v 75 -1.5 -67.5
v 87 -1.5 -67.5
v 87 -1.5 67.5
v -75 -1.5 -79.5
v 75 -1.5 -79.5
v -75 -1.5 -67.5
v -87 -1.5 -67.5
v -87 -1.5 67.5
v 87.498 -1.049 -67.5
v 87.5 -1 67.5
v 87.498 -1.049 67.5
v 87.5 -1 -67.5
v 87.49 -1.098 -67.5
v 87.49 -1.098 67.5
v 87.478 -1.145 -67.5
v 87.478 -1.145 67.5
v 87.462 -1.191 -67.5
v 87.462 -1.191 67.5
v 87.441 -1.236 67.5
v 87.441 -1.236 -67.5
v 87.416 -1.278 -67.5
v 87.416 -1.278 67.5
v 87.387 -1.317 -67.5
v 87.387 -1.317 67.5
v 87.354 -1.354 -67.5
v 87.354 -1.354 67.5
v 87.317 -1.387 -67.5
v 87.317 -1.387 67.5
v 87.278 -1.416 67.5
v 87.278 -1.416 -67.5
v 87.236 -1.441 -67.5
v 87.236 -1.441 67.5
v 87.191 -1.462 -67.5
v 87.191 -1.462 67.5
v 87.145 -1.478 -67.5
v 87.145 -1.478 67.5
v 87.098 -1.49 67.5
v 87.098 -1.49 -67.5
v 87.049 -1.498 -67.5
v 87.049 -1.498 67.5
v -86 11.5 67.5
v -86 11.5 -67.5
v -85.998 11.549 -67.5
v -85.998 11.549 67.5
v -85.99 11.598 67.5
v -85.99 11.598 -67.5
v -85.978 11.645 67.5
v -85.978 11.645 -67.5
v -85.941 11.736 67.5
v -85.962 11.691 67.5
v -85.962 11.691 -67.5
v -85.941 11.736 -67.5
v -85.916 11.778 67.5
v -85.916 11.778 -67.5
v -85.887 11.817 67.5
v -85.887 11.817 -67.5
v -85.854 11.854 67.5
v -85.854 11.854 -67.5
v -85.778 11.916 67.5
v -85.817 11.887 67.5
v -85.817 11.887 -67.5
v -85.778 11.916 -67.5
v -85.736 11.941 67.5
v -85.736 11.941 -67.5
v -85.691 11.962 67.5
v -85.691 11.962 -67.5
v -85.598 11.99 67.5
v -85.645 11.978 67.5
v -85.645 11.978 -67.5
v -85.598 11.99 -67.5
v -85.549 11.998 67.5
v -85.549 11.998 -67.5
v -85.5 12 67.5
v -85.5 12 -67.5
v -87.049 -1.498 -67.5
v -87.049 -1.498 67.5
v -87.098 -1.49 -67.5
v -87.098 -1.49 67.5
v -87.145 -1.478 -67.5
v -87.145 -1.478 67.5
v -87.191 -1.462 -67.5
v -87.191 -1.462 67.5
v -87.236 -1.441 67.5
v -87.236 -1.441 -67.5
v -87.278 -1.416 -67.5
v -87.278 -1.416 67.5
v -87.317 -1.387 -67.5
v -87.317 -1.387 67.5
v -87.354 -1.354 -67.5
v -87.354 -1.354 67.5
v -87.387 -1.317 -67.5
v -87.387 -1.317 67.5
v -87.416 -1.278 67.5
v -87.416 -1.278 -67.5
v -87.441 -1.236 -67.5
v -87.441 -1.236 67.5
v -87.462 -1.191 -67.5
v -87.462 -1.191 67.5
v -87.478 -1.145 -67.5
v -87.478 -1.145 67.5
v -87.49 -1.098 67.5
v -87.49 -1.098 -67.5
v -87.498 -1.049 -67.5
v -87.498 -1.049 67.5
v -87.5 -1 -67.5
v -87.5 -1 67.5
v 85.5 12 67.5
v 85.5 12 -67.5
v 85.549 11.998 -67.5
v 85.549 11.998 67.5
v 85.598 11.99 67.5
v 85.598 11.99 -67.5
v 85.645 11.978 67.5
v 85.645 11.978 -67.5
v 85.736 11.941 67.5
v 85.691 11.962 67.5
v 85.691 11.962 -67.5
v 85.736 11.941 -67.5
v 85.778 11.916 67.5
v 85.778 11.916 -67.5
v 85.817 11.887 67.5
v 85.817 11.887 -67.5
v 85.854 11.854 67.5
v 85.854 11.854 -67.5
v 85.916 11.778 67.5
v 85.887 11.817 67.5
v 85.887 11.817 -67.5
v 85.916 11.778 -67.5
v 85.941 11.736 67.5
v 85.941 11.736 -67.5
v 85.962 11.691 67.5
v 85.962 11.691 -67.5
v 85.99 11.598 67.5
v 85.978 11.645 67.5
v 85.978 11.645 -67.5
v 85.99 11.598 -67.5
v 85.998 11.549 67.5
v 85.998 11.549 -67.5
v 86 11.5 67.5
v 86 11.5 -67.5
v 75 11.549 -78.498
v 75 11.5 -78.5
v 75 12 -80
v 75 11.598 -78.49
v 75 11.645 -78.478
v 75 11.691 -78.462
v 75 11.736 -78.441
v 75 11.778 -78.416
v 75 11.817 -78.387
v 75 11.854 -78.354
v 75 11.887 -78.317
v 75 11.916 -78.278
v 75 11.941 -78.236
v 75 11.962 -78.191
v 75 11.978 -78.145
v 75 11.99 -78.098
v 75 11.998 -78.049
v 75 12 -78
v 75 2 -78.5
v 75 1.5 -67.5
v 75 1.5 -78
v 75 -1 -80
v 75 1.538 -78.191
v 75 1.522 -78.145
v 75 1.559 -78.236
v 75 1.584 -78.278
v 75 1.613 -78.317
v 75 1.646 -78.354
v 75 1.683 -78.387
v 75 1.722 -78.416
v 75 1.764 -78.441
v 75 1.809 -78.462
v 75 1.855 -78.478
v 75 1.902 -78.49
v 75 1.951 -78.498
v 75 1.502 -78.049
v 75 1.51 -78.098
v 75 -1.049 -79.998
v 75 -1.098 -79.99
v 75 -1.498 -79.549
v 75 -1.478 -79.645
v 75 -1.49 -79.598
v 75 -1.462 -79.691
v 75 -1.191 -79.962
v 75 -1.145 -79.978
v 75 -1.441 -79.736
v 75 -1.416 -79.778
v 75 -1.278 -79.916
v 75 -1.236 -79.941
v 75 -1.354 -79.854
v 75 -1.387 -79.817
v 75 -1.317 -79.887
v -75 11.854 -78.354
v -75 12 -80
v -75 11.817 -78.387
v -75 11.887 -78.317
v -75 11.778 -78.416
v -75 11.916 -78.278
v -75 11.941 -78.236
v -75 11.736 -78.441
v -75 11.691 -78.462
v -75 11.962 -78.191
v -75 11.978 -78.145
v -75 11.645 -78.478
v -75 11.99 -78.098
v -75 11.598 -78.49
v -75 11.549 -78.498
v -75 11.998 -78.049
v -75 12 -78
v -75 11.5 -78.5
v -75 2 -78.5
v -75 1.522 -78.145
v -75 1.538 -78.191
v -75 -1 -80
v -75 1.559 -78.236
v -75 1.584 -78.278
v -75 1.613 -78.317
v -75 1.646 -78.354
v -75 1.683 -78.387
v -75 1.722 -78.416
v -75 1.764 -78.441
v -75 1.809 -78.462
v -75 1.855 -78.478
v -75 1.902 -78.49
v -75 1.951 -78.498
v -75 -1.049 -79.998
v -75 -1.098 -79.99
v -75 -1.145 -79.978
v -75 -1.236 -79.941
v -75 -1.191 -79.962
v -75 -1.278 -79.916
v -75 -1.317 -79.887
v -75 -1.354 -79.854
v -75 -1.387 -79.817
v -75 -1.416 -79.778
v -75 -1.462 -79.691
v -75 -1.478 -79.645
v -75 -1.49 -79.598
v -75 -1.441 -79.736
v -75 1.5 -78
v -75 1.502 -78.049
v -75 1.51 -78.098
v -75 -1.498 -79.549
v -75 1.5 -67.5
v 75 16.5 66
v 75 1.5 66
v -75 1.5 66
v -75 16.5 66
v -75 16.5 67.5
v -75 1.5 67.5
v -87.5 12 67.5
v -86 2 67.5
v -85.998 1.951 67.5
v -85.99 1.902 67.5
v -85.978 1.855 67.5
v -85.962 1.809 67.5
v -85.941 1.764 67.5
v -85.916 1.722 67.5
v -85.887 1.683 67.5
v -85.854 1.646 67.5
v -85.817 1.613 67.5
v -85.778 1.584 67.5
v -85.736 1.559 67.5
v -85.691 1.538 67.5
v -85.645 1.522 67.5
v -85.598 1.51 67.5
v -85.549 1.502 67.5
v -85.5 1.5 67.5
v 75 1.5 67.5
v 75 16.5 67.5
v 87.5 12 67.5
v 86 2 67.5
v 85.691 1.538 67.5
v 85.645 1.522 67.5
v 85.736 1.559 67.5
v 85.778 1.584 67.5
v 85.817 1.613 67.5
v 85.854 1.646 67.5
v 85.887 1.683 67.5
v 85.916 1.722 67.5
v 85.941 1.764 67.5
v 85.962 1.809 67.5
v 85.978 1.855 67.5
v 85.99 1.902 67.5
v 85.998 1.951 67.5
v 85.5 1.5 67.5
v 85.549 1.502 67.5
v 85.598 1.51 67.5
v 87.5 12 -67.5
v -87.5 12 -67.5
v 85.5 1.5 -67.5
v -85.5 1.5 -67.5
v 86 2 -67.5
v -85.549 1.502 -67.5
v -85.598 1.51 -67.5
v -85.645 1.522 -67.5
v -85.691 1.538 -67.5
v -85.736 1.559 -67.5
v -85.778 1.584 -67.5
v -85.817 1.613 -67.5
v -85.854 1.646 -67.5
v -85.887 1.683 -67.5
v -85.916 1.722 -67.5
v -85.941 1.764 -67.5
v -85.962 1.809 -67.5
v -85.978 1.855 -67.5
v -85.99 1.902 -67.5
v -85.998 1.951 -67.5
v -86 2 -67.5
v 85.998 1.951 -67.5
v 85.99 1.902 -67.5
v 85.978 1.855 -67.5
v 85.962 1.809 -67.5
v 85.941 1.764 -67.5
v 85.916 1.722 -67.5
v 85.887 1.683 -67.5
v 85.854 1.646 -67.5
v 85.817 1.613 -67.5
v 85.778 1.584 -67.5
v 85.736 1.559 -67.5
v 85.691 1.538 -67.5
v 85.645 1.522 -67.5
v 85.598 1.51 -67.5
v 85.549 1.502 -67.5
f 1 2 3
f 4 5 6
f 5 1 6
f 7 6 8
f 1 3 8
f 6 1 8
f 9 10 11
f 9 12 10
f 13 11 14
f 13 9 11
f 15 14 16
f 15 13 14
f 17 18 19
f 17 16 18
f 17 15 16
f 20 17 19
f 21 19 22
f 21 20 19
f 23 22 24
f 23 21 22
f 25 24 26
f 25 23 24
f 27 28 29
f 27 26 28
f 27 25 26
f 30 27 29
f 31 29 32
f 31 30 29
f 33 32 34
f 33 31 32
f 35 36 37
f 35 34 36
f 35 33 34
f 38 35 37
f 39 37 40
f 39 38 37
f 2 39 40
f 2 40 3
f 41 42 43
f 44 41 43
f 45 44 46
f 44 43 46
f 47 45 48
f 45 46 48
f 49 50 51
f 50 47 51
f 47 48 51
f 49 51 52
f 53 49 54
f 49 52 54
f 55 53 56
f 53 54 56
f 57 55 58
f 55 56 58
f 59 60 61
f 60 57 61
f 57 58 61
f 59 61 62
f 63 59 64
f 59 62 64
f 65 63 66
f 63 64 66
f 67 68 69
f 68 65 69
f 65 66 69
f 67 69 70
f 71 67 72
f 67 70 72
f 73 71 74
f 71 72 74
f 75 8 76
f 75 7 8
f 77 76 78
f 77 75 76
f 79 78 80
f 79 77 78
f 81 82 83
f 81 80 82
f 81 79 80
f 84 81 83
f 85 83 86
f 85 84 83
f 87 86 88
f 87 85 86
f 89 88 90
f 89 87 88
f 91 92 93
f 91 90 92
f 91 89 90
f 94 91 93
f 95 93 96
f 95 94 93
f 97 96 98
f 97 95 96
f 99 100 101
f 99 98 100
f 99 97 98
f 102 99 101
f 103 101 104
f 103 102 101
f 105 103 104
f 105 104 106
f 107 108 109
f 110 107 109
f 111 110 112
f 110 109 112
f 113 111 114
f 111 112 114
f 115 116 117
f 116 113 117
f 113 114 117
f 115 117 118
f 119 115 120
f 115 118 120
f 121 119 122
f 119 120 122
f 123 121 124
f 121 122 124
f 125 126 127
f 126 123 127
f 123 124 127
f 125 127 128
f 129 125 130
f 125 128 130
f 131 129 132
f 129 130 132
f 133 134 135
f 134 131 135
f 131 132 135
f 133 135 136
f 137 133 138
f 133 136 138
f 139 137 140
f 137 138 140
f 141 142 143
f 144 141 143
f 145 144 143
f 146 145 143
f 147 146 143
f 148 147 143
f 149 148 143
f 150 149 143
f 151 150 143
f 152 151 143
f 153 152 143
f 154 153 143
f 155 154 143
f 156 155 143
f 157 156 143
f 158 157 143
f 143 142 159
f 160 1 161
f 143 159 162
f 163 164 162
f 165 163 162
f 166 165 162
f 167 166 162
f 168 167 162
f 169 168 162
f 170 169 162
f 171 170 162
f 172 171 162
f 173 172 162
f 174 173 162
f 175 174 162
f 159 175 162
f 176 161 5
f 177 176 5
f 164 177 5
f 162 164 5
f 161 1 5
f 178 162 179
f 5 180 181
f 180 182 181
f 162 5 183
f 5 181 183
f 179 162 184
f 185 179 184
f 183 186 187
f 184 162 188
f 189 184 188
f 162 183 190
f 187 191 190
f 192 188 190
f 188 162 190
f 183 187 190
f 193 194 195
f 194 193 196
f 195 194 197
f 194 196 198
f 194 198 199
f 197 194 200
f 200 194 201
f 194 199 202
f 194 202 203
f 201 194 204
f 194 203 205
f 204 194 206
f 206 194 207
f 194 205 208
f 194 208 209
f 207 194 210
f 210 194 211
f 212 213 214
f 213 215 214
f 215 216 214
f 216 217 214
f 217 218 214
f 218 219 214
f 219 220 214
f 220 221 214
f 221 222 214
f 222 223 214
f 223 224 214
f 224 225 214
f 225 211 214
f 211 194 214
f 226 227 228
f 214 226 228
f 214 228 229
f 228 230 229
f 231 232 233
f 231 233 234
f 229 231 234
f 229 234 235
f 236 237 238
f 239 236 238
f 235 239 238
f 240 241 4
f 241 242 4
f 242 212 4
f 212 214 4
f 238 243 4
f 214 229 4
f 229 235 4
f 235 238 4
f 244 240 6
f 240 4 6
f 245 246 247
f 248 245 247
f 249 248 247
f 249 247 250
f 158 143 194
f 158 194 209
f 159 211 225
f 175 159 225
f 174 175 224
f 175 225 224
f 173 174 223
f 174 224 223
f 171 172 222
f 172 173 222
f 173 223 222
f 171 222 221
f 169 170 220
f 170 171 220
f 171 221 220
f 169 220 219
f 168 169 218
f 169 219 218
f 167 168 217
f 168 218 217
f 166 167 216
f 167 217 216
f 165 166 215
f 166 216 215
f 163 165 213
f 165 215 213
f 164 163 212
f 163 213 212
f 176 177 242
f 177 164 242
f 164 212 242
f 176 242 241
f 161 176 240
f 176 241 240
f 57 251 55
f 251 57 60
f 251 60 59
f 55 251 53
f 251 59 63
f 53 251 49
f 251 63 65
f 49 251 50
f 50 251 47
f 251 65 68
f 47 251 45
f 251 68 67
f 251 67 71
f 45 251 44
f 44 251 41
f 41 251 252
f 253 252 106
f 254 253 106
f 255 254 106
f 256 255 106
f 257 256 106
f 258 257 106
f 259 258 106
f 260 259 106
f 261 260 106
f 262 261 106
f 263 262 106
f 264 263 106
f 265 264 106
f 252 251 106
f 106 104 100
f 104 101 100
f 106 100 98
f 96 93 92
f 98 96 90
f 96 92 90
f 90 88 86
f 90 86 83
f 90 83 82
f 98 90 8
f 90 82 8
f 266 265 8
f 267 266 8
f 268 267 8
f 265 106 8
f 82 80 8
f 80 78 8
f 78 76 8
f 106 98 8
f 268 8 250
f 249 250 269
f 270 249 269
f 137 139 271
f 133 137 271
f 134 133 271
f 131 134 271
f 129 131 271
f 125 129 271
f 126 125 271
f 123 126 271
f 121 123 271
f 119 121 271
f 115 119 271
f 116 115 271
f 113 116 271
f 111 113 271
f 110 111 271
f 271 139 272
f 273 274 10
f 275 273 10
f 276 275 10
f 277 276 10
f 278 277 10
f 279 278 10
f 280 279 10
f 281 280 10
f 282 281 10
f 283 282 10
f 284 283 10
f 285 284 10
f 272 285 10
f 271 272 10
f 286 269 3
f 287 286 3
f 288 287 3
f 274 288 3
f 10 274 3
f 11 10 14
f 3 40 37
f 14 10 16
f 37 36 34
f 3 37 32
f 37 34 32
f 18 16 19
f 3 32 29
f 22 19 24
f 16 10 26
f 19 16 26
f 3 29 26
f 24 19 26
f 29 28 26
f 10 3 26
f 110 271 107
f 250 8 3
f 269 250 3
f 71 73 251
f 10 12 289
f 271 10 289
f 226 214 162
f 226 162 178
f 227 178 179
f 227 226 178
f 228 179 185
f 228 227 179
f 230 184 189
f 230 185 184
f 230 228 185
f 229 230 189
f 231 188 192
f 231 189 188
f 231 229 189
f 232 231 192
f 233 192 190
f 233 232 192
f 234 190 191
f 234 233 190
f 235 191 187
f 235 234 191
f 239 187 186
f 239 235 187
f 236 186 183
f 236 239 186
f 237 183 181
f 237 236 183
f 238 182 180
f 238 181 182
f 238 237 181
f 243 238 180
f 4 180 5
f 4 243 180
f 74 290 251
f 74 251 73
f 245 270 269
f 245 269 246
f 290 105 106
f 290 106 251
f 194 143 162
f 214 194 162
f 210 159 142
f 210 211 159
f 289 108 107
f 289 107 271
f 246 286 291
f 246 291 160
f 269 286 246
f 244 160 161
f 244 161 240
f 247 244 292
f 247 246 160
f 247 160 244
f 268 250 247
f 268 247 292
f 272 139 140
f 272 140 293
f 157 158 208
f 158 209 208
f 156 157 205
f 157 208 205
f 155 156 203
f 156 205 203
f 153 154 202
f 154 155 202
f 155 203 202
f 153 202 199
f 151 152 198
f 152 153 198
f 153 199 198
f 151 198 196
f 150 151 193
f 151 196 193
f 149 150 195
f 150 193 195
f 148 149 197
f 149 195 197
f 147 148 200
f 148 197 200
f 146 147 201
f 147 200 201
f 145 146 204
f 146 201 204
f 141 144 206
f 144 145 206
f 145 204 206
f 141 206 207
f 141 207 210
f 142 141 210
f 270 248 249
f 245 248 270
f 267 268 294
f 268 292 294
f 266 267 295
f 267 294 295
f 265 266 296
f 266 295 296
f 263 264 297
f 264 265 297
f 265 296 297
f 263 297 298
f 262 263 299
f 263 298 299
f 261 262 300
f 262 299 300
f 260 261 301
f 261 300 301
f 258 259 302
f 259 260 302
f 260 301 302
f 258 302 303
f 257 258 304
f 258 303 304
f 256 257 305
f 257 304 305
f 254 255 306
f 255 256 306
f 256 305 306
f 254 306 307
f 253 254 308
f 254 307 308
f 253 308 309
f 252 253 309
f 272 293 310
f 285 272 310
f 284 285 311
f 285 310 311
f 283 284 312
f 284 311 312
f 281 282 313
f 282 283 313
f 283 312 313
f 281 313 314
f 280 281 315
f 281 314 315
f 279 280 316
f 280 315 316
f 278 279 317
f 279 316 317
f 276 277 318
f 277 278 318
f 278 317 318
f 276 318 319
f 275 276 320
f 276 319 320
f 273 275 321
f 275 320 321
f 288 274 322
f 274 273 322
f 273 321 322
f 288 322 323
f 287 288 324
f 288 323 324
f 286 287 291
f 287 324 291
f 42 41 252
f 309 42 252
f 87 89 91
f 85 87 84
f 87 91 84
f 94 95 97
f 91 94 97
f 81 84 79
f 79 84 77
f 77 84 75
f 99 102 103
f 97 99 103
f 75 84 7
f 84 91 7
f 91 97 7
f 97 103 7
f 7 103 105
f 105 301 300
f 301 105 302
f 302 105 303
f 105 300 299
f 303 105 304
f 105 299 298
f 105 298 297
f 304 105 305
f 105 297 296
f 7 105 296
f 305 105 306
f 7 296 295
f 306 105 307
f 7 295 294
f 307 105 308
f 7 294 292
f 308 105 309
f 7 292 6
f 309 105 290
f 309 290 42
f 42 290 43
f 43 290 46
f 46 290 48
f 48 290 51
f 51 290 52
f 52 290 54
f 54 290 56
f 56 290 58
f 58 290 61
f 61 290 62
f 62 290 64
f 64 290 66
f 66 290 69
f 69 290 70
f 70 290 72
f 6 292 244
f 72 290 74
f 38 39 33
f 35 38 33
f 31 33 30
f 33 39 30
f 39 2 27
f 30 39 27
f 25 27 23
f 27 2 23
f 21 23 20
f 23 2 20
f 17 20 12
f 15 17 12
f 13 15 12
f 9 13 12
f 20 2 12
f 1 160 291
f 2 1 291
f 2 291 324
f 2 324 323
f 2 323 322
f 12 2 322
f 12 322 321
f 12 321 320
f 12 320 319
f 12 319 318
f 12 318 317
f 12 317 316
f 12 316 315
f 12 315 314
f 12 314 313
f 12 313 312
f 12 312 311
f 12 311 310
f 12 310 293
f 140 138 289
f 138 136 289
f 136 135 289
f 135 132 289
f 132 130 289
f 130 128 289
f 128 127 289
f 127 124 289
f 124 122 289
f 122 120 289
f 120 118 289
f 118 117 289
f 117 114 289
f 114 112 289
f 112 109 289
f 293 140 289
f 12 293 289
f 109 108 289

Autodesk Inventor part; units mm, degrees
sketch "Skizze1" plane through (0, 0, 0) normal (0, 1, 0) x (-1, 0, 0)
  line L0 (75, 67.5) -> (-75, 67.5)
  line L1 (-75, 67.5) -> (-75, -67.5)
  line L2 (-75, -67.5) -> (75, -67.5)
  line L3 (75, -67.5) -> (75, 67.5)
  line L4 (75, 67.5) -> (-75, -67.5) construction
  line L5 (-75, 67.5) -> (75, -67.5) construction
  point P0 (0, 0)
  dimension "d0" = 150
  dimension "d1" = 135
extrude "Extrusion1" add sketch "Skizze1" along normal mid plane 3
sketch "Skizze2" plane through (0, 1.5, 0) normal (0, 1, 0) x (1, 0, 0)
  line L0 (-75, 67.5) -> (-75, -67.5) projected
  line L1 (75, -67.5) -> (75, 67.5) projected
  line L2 (-75, -67.5) -> (75, -67.5)
  line L3 (75, -67.5) -> (75, -66)
  line L4 (75, -66) -> (-75, -66)
  line L5 (-75, -66) -> (-75, -67.5)
  point P0 (0, 0)
  dimension "d4" = 135
  dimension "d5" = 1.5
extrude "Extrusion2" add sketch "Skizze2" along normal blind 15
sketch "Skizze3" plane through (0, 0, 0) normal (1, 0, 0) x (0, 1, 0)
  line L0 (1.5, -67.5) -> (1.5, 66) projected
  line L1 (1.5, -67.5) -> (-1.5, -67.5)
  line L2 (-1.5, -67.5) -> (-1.5, -77.5)
  line L3 (-1.5, -77.5) -> (1.5, -77.5)
  line L4 (1.5, -77.5) -> (1.5, -67.5)
  line L5 (2, -78.5) -> (11.5, -78.5)
  line L6 (1.5, -77.5) -> (1.5, -78)
  line L7 (-1.5, -77.5) -> (-1.5, -79.5)
  arc A0 (1.5, -78) -> (2, -78.5) centre (2, -78) ccw
  line L8 (12, -78.5) -> (12, -80)
  line L9 (12, -80) -> (-1, -80)
  arc A1 (-1.5, -79.5) -> (-1, -80) centre (-1, -79.5) ccw
  line L10 (12, -78) -> (12, -78)
  arc A2 (11.5, -78.5) -> (12, -78) centre (11.5, -78) ccw
  line L11 (12, -78.5) -> (12, -78)
  point P0 (0, 0)
  dimension "d8" = 10
  dimension "d16" = 1.5
  dimension "d17" = 0.5
  dimension "d19" = 10
  dimension "d20" = 0.5
extrude "Extrusion3" add sketch "Skizze3" along normal mid plane 150
sketch "Skizze5" plane through (0, 0, 0) normal (0, 0, 1) x (1, 0, 0)
  line L0 (75, 16.5) -> (75, -1.5) projected
  line L1 (75, -1.5) -> (87, -1.5)
  line L2 (87.5, -1) -> (87.5, 12)
  line L3 (85.5, 12) -> (85.5, 12)
  line L4 (86, 11.5) -> (86, 2)
  arc A0 (86, 11.5) -> (85.5, 12) centre (85.5, 11.5) ccw
  line L5 (85.5, 12) -> (87.5, 12)
  line L6 (75, 1.5) -> (85.5, 1.5)
  line L7 (75, -1.5) -> (-75, -1.5) projected
  line L8 (75, -1.5) -> (75, 1.5)
  arc A1 (85.5, 1.5) -> (86, 2) centre (85.5, 2) ccw
  arc A2 (87, -1.5) -> (87.5, -1) centre (87, -1) ccw
  line L9 (-75, -1.5) -> (-75, 16.5) projected
  line L10 (-75, -1.5) -> (-87, -1.5)
  line L11 (-87.5, -1) -> (-87.5, 12)
  line L12 (-85.5, 12) -> (-85.5, 12)
  line L13 (-86, 11.5) -> (-86, 2)
  line L14 (-85.5, 1.5) -> (-75, 1.5)
  line L15 (-75, 1.5) -> (-75, -1.5)
  arc A3 (-85.5, 12) -> (-86, 11.5) centre (-85.5, 11.5) ccw
  line L16 (-87.5, 12) -> (-85.5, 12)
  arc A4 (-86, 2) -> (-85.5, 1.5) centre (-85.5, 2) ccw
  arc A5 (-87.5, -1) -> (-87, -1.5) centre (-87, -1) ccw
  point P0 (0, 0)
  point P1 (87.5, -1.5)
  point P2 (-87.5, -1.5)
  point P3 (-86, 12)
  point P4 (-86, 1.5)
  dimension "d39" = 13.5
  dimension "d42" = 0.5
  dimension "d43" = 0.5
  dimension "d44" = 12.5
  dimension "d45" = 1.5
  dimension "d46" = 2
  dimension "d48" = 10.5
  dimension "d49" = 12.5
  dimension "d50" = 13.5
  dimension "d51" = 2
  dimension "d52" = 10.5
  dimension "d53" = 0.5
  dimension "d54" = 0.5
extrude "Extrusion4" add sketch "Skizze5" along normal mid plane 135
properties part number "deckel"
